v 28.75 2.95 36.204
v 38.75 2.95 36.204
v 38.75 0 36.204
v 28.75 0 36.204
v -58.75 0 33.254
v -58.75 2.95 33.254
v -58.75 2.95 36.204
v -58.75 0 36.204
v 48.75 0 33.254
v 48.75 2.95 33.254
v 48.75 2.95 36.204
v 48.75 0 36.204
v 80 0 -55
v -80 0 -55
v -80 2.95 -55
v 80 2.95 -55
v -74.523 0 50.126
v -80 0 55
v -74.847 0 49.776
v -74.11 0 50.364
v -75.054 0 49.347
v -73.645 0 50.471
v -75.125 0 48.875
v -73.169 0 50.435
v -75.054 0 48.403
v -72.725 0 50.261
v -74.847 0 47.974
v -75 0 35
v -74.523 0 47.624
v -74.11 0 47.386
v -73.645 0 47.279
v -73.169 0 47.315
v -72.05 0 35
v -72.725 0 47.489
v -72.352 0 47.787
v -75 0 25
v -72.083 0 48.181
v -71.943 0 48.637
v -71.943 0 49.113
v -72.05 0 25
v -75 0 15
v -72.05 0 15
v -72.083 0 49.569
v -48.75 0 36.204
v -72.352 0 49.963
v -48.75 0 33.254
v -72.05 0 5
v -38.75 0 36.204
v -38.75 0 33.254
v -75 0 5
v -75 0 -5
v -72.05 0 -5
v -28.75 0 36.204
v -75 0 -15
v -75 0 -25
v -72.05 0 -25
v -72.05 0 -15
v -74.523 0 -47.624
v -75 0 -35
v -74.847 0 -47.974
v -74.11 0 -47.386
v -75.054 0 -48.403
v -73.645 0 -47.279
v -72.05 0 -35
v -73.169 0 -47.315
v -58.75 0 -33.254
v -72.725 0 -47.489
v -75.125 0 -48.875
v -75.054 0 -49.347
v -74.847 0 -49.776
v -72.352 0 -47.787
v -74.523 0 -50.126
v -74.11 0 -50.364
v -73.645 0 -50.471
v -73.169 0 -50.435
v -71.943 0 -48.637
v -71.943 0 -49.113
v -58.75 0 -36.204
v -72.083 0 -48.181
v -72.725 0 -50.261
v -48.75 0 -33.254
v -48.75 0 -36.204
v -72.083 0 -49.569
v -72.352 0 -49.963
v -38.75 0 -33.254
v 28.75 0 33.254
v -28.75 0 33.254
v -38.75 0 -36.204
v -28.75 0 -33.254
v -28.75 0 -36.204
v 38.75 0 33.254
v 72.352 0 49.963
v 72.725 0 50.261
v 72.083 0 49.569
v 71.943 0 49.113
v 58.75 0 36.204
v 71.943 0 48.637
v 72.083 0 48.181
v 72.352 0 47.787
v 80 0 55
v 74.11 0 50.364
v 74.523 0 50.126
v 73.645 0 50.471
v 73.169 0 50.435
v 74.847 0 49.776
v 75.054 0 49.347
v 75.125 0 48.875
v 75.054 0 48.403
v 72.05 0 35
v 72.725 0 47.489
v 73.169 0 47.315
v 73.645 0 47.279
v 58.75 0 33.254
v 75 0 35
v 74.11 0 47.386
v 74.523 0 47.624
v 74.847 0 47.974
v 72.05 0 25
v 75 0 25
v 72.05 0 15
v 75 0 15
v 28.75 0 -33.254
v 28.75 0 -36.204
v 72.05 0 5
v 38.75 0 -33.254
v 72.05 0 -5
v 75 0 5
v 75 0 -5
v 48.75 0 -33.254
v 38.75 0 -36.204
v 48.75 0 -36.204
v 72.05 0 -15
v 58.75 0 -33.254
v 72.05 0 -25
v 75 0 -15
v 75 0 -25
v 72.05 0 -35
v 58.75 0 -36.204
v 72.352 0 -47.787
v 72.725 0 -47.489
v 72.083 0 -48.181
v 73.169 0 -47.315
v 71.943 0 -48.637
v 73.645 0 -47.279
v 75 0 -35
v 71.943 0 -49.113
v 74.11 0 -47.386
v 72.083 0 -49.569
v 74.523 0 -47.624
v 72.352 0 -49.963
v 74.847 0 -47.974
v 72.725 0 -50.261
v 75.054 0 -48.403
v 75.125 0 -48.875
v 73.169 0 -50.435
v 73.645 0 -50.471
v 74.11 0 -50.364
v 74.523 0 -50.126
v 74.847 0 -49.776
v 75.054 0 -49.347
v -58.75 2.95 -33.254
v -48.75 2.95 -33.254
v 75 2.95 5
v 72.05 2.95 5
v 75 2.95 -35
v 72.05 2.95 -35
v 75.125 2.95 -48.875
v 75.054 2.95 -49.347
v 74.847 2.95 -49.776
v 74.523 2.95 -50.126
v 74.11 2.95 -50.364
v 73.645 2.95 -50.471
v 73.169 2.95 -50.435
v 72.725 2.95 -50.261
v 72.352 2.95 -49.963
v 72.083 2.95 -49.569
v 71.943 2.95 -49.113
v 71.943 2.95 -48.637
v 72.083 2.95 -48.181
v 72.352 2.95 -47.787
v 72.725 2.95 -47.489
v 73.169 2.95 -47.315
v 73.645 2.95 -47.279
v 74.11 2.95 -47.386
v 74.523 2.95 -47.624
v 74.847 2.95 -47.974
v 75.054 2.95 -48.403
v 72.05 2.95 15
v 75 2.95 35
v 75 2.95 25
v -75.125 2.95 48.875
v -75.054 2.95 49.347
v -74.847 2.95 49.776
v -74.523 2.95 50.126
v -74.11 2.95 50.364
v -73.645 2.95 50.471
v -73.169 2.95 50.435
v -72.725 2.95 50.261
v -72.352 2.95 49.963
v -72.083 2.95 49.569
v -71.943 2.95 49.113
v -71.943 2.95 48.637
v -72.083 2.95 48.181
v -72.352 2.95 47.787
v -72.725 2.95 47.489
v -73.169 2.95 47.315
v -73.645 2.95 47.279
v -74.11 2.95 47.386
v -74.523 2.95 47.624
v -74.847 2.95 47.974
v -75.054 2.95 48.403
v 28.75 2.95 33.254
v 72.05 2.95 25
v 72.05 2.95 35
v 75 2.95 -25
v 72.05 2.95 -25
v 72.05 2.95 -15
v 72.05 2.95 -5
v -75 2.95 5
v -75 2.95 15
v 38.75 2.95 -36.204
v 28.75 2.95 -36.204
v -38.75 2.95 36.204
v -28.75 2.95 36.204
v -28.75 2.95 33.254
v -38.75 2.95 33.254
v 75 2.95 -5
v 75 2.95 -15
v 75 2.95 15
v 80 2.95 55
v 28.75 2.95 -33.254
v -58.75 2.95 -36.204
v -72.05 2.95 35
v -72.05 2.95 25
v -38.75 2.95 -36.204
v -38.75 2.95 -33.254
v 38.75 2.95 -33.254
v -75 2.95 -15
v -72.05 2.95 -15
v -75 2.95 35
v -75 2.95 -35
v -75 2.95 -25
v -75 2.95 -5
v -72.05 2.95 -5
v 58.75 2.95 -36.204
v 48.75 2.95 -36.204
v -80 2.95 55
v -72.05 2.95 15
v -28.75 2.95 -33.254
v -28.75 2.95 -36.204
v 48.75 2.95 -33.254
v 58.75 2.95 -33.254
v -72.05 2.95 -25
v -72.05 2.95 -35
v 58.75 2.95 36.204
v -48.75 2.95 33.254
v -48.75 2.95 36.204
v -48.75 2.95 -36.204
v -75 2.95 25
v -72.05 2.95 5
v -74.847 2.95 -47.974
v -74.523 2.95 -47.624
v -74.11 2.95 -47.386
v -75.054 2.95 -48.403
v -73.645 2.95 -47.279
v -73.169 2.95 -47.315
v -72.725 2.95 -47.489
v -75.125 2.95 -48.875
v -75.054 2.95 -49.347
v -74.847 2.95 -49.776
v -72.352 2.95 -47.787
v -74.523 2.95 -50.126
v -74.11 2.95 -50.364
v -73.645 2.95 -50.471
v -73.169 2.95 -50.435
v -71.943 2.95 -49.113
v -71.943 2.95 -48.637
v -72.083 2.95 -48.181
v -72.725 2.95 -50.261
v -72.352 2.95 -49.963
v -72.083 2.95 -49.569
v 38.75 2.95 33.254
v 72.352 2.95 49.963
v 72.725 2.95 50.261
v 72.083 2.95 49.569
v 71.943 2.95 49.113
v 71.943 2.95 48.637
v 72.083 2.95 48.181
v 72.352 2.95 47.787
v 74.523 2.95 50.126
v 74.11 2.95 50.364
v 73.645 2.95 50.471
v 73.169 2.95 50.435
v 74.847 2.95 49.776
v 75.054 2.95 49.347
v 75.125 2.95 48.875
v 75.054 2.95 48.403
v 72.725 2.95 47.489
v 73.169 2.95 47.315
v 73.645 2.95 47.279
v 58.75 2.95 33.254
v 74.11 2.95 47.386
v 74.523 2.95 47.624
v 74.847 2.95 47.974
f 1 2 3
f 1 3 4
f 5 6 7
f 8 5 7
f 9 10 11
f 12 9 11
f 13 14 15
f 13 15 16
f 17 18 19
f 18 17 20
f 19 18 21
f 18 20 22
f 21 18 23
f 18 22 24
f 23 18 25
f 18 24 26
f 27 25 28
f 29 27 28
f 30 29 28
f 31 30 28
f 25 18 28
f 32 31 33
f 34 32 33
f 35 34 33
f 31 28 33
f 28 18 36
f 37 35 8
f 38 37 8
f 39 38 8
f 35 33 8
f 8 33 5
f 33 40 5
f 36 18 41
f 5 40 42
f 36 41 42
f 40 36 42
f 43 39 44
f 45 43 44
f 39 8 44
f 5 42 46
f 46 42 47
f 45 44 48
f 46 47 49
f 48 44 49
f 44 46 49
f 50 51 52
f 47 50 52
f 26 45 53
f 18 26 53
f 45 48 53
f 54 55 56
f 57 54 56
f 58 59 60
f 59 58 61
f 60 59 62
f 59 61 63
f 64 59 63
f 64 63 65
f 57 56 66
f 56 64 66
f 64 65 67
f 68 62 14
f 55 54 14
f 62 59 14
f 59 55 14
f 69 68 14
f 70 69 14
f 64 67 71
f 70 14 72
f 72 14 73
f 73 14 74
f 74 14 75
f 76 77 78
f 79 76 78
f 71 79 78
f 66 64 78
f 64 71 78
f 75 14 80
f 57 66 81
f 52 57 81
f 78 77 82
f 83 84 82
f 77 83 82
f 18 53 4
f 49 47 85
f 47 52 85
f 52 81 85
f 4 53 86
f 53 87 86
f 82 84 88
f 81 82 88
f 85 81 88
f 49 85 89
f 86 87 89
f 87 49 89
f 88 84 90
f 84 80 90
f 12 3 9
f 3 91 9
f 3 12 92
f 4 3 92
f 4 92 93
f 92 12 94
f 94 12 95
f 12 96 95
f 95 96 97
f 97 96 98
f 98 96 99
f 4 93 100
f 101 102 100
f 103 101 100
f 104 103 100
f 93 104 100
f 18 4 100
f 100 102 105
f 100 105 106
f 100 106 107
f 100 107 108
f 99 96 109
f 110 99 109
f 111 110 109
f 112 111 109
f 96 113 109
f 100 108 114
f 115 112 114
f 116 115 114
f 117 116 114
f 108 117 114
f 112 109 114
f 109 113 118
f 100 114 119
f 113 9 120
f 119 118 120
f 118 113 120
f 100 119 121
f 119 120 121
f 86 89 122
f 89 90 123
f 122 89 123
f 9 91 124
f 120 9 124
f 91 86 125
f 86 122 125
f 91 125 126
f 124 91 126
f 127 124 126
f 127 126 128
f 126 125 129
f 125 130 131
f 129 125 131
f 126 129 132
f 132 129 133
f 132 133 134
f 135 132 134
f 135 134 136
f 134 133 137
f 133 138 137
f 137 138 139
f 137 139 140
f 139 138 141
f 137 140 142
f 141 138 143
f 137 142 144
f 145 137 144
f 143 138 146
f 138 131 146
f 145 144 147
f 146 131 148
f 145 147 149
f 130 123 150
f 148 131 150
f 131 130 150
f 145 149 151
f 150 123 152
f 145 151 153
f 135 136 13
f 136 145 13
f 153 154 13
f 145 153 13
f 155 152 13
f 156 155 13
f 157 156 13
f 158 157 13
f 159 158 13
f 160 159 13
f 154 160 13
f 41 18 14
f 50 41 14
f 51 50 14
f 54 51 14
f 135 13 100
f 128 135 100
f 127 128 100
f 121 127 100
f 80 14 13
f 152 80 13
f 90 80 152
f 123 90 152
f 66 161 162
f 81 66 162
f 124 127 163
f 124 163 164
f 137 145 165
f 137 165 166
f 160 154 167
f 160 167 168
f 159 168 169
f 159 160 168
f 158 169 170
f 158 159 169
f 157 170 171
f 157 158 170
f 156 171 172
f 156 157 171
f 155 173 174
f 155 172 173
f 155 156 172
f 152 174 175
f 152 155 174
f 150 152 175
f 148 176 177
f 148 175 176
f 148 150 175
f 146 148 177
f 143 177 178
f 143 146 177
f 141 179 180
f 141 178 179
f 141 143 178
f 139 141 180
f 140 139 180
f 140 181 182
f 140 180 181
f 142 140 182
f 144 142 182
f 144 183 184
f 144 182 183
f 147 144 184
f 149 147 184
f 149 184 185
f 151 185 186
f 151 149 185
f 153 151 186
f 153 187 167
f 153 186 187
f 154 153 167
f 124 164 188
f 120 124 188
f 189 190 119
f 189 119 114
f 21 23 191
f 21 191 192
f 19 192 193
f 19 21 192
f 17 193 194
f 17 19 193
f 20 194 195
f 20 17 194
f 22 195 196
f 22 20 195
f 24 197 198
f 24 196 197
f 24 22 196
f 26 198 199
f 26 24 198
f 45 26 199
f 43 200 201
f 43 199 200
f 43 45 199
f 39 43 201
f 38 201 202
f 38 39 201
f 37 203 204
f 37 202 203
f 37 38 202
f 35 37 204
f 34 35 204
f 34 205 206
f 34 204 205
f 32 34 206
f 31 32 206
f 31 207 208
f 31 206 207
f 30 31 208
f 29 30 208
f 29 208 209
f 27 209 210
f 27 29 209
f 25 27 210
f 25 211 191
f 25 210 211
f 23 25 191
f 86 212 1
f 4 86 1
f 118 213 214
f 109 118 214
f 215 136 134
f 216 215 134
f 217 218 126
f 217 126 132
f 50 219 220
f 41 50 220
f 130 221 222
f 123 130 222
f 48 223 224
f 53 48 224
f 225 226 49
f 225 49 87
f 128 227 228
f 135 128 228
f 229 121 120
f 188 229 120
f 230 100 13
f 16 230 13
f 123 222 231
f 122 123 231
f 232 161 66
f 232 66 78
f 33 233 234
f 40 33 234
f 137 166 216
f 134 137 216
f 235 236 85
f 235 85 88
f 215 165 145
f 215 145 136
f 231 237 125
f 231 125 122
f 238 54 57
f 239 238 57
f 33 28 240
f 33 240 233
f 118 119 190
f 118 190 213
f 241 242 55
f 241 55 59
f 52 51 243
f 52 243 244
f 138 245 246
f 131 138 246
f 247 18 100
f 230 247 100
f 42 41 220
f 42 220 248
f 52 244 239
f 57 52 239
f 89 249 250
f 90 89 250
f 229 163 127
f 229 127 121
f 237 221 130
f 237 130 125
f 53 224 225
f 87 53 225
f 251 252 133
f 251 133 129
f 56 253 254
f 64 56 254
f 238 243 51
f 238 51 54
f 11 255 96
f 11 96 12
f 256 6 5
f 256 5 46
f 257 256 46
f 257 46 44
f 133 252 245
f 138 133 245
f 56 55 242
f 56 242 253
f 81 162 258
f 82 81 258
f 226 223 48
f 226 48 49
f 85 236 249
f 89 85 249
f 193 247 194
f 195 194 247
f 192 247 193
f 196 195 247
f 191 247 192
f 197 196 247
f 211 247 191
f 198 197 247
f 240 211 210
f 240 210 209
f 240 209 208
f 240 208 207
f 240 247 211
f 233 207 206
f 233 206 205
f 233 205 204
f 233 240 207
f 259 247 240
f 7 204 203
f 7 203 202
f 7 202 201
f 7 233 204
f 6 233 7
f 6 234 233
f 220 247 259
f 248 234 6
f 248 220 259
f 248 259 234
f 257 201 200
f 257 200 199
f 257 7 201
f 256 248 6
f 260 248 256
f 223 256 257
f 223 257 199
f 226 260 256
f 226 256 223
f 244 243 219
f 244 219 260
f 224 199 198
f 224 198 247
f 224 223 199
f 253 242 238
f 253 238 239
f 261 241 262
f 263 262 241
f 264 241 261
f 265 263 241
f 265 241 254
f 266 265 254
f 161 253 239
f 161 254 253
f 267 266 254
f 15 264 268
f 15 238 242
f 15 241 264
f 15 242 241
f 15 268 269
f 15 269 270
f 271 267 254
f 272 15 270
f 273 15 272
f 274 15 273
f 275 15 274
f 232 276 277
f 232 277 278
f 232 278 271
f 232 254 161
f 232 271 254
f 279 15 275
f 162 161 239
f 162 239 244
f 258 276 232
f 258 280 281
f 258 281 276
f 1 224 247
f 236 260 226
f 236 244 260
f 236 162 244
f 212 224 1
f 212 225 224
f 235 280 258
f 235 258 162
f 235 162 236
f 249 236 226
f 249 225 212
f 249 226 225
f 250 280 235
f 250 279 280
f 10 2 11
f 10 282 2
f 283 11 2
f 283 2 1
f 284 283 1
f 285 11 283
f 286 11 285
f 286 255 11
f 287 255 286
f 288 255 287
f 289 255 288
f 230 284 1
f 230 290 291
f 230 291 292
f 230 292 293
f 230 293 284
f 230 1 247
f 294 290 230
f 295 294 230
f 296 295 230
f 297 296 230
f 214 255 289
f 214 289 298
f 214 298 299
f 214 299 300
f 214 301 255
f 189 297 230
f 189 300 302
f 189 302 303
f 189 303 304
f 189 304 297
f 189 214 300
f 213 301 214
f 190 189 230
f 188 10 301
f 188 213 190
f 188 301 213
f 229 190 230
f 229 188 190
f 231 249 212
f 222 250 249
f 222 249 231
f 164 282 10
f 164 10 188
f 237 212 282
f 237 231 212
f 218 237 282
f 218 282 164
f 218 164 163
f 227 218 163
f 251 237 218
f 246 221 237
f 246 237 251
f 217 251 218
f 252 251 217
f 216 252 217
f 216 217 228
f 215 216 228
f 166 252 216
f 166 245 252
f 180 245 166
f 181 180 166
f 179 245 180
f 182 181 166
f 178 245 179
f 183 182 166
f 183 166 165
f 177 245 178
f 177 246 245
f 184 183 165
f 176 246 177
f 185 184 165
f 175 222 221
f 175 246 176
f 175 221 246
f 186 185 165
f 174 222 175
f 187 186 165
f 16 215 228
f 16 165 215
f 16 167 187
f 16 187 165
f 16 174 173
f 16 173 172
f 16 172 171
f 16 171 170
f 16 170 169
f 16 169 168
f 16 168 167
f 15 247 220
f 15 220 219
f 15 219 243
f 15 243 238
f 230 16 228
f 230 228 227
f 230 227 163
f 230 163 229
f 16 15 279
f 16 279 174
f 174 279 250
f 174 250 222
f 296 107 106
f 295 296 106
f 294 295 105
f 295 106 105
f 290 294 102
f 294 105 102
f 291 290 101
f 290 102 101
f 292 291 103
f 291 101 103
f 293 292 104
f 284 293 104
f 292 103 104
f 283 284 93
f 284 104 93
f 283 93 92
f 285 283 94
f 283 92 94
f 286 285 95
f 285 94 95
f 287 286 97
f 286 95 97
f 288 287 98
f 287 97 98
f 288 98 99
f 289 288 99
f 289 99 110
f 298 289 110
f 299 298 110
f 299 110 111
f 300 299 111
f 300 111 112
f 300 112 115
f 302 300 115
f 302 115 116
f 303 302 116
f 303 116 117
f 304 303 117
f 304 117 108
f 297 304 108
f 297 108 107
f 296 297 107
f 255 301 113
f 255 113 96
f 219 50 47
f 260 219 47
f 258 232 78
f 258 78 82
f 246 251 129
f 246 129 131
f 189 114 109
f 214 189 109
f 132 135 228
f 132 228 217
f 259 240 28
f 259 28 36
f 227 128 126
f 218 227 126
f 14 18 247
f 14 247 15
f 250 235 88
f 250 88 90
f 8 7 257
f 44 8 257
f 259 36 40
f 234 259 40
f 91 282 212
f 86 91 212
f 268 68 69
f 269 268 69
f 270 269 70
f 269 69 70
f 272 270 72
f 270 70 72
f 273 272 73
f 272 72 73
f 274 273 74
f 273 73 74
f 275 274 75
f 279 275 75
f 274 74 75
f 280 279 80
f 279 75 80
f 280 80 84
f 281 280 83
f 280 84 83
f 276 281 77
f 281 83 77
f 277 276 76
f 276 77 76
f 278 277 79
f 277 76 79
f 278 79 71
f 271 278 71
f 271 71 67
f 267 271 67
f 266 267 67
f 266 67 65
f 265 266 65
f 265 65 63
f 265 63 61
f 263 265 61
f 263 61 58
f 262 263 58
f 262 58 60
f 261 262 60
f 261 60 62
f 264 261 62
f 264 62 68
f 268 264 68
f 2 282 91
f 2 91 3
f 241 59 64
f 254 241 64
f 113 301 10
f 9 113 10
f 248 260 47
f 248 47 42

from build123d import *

# Parameters (mm, degrees)
SKETCH1_W               = 160
SKETCH1_H               = 110
BOSS_EXTRUDE1_DEPTH     = 2.95
SKETCH2_W               = 10
SKETCH2_H               = 2.95
CUT_EXTRUDE1_DEPTH      = 3.95
LPATTERN2_COUNT         = 2
LPATTERN2_PITCH         = 20
MIRROR1_COPY_1_SKETCH_W = 10
MIRROR1_COPY_1_SKETCH_H = 2.95
MIRROR1_COPY_1_DEPTH    = 3.95
MIRROR2_COPY_1_SKETCH_W = 10
MIRROR2_COPY_1_SKETCH_H = 2.95
MIRROR2_COPY_1_DEPTH    = 3.95
MIRROR2_COPY_2_SKETCH_W = 10
MIRROR2_COPY_2_SKETCH_H = 2.95
MIRROR2_COPY_2_DEPTH    = 3.95
MIRROR2_COPY_3_SKETCH_W = 10
MIRROR2_COPY_3_SKETCH_H = 2.95
MIRROR2_COPY_3_DEPTH    = 3.95
SKETCH4_W               = 2.95
SKETCH4_H               = 10
CUT_EXTRUDE2_DEPTH      = 3.95
LPATTERN3_COUNT         = 3
LPATTERN3_PITCH         = 20
MIRROR4_COPY_1_SKETCH_W = 2.95
MIRROR4_COPY_1_SKETCH_H = 10
MIRROR4_COPY_1_DEPTH    = 3.95
MIRROR5_COPY_1_SKETCH_W = 2.95
MIRROR5_COPY_1_SKETCH_H = 10
MIRROR5_COPY_1_DEPTH    = 3.95
MIRROR5_COPY_2_SKETCH_W = 2.95
MIRROR5_COPY_2_SKETCH_H = 10
MIRROR5_COPY_2_DEPTH    = 3.95
MIRROR5_COPY_3_SKETCH_W = 2.95
MIRROR5_COPY_3_SKETCH_H = 10
MIRROR5_COPY_3_DEPTH    = 3.95
M3_CLEARANCE_HOLE1_D    = 3.2
MIRROR7_COPY_1_D        = 3.2


with BuildPart() as part:
    # Sketch1 → Boss-Extrude1 (new body)
    with BuildSketch(Plane(origin=(0, 0, 0), x_dir=(1, 0, 0), z_dir=(0, 1, 0))):
        Rectangle(SKETCH1_W, SKETCH1_H)
    extrude(amount=BOSS_EXTRUDE1_DEPTH)

    # Sketch2 → Cut-Extrude1 (cut, through all)
    with BuildSketch(Plane(origin=(0, 2.95, 0), x_dir=(1, 0, 0), z_dir=(0, 1, 0))):
        with Locations((-53.75, 34.729)):
            Rectangle(SKETCH2_W, SKETCH2_H)
    cut_extrude1 = extrude(amount=-CUT_EXTRUDE1_DEPTH, mode=Mode.SUBTRACT)

    # LPattern2: Cut-Extrude1 ×2
    with Locations(*[(i * LPATTERN2_PITCH, 0, 0) for i in range(1, LPATTERN2_COUNT)]):
        add(cut_extrude1, mode=Mode.SUBTRACT)

    # Mirror1: Cut-Extrude1 across plane
    add(cut_extrude1.mirror(Plane.XY), mode=Mode.SUBTRACT)

    # Mirror1 copy 1 sketch → Mirror1 copy 1 (cut, through all)
    with BuildSketch(Plane(origin=(20, 2.95, 0), x_dir=(1, 0, 0), z_dir=(0, 1, 0))):
        with Locations((-53.75, -34.729)):
            Rectangle(MIRROR1_COPY_1_SKETCH_W, MIRROR1_COPY_1_SKETCH_H)
    extrude(amount=-MIRROR1_COPY_1_DEPTH, mode=Mode.SUBTRACT)

    # Mirror2: Cut-Extrude1 across plane
    add(cut_extrude1.mirror(Plane(origin=(0, 0, 0), x_dir=(0, 0, 1), z_dir=(1, 0, 0))), mode=Mode.SUBTRACT)

    # Mirror2 copy 1 sketch → Mirror2 copy 1 (cut, through all)
    with BuildSketch(Plane(origin=(0, 2.95, 0), x_dir=(-1, 0, 0), z_dir=(0, 1, 0))):
        with Locations((-53.75, 34.729)):
            Rectangle(MIRROR2_COPY_1_SKETCH_W, MIRROR2_COPY_1_SKETCH_H)
    extrude(amount=-MIRROR2_COPY_1_DEPTH, mode=Mode.SUBTRACT)

    # Mirror2 copy 2 sketch → Mirror2 copy 2 (cut, through all)
    with BuildSketch(Plane(origin=(-20, 2.95, 0), x_dir=(-1, 0, 0), z_dir=(0, 1, 0))):
        with Locations((-53.75, 34.729)):
            Rectangle(MIRROR2_COPY_2_SKETCH_W, MIRROR2_COPY_2_SKETCH_H)
    extrude(amount=-MIRROR2_COPY_2_DEPTH, mode=Mode.SUBTRACT)

    # Mirror2 copy 3 sketch → Mirror2 copy 3 (cut, through all)
    with BuildSketch(Plane(origin=(-20, 2.95, 0), x_dir=(-1, 0, 0), z_dir=(0, 1, 0))):
        with Locations((-53.75, -34.729)):
            Rectangle(MIRROR2_COPY_3_SKETCH_W, MIRROR2_COPY_3_SKETCH_H)
    extrude(amount=-MIRROR2_COPY_3_DEPTH, mode=Mode.SUBTRACT)

    # Sketch4 → Cut-Extrude2 (cut, through all)
    with BuildSketch(Plane(origin=(0, 2.95, 0), x_dir=(1, 0, 0), z_dir=(0, 1, 0))):
        with Locations((-73.525, 10)):
            Rectangle(SKETCH4_W, SKETCH4_H)
    cut_extrude2 = extrude(amount=-CUT_EXTRUDE2_DEPTH, mode=Mode.SUBTRACT)

    # LPattern3: Cut-Extrude2 ×3, 1 skipped
    with Locations(*[(0, 0, -i * LPATTERN3_PITCH) for i in range(1, LPATTERN3_COUNT) if i not in (2,)]):
        add(cut_extrude2, mode=Mode.SUBTRACT)

    # Mirror4: Cut-Extrude2 across plane
    add(cut_extrude2.mirror(Plane.XY), mode=Mode.SUBTRACT)

    # Mirror4 copy 1 sketch → Mirror4 copy 1 (cut, through all)
    with BuildSketch(Plane(origin=(0, 2.95, 20), x_dir=(1, 0, 0), z_dir=(0, 1, 0))):
        with Locations((-73.525, -10)):
            Rectangle(MIRROR4_COPY_1_SKETCH_W, MIRROR4_COPY_1_SKETCH_H)
    extrude(amount=-MIRROR4_COPY_1_DEPTH, mode=Mode.SUBTRACT)

    # Mirror5: Cut-Extrude2 across plane
    add(cut_extrude2.mirror(Plane(origin=(0, 0, 0), x_dir=(0, 0, 1), z_dir=(1, 0, 0))), mode=Mode.SUBTRACT)

    # Mirror5 copy 1 sketch → Mirror5 copy 1 (cut, through all)
    with BuildSketch(Plane(origin=(0, 2.95, 0), x_dir=(-1, 0, 0), z_dir=(0, 1, 0))):
        with Locations((-73.525, 10)):
            Rectangle(MIRROR5_COPY_1_SKETCH_W, MIRROR5_COPY_1_SKETCH_H)
    extrude(amount=-MIRROR5_COPY_1_DEPTH, mode=Mode.SUBTRACT)

    # Mirror5 copy 2 sketch → Mirror5 copy 2 (cut, through all)
    with BuildSketch(Plane(origin=(0, 2.95, 20), x_dir=(-1, 0, 0), z_dir=(0, 1, 0))):
        with Locations((-73.525, 10)):
            Rectangle(MIRROR5_COPY_2_SKETCH_W, MIRROR5_COPY_2_SKETCH_H)
    extrude(amount=-MIRROR5_COPY_2_DEPTH, mode=Mode.SUBTRACT)

    # Mirror5 copy 3 sketch → Mirror5 copy 3 (cut, through all)
    with BuildSketch(Plane(origin=(0, 2.95, -20), x_dir=(-1, 0, 0), z_dir=(0, 1, 0))):
        with Locations((-73.525, -10)):
            Rectangle(MIRROR5_COPY_3_SKETCH_W, MIRROR5_COPY_3_SKETCH_H)
    extrude(amount=-MIRROR5_COPY_3_DEPTH, mode=Mode.SUBTRACT)

    # M3 Clearance Hole1 (through all)
    with Locations(Plane(origin=(0, 2.95, 0), x_dir=(1, 0, 0), z_dir=(0, 1, 0))):
        with Locations((-73.525, 48.875)):
            m3_clearance_hole1 = Hole(M3_CLEARANCE_HOLE1_D / 2)

    # Mirror6: M3 Clearance Hole1 across plane
    add(m3_clearance_hole1.mirror(Plane.XY), mode=Mode.SUBTRACT)

    # Mirror7: M3 Clearance Hole1 across plane
    add(m3_clearance_hole1.mirror(Plane(origin=(0, 0, 0), x_dir=(0, 0, 1), z_dir=(1, 0, 0))), mode=Mode.SUBTRACT)

    # Mirror7 copy 1 (through all)
    with Locations(Plane(origin=(0, 2.95, 0), x_dir=(-1, 0, 0), z_dir=(0, 1, 0))):
        with Locations((-73.525, 48.875)):
            Hole(MIRROR7_COPY_1_D / 2)


solid = part.part
